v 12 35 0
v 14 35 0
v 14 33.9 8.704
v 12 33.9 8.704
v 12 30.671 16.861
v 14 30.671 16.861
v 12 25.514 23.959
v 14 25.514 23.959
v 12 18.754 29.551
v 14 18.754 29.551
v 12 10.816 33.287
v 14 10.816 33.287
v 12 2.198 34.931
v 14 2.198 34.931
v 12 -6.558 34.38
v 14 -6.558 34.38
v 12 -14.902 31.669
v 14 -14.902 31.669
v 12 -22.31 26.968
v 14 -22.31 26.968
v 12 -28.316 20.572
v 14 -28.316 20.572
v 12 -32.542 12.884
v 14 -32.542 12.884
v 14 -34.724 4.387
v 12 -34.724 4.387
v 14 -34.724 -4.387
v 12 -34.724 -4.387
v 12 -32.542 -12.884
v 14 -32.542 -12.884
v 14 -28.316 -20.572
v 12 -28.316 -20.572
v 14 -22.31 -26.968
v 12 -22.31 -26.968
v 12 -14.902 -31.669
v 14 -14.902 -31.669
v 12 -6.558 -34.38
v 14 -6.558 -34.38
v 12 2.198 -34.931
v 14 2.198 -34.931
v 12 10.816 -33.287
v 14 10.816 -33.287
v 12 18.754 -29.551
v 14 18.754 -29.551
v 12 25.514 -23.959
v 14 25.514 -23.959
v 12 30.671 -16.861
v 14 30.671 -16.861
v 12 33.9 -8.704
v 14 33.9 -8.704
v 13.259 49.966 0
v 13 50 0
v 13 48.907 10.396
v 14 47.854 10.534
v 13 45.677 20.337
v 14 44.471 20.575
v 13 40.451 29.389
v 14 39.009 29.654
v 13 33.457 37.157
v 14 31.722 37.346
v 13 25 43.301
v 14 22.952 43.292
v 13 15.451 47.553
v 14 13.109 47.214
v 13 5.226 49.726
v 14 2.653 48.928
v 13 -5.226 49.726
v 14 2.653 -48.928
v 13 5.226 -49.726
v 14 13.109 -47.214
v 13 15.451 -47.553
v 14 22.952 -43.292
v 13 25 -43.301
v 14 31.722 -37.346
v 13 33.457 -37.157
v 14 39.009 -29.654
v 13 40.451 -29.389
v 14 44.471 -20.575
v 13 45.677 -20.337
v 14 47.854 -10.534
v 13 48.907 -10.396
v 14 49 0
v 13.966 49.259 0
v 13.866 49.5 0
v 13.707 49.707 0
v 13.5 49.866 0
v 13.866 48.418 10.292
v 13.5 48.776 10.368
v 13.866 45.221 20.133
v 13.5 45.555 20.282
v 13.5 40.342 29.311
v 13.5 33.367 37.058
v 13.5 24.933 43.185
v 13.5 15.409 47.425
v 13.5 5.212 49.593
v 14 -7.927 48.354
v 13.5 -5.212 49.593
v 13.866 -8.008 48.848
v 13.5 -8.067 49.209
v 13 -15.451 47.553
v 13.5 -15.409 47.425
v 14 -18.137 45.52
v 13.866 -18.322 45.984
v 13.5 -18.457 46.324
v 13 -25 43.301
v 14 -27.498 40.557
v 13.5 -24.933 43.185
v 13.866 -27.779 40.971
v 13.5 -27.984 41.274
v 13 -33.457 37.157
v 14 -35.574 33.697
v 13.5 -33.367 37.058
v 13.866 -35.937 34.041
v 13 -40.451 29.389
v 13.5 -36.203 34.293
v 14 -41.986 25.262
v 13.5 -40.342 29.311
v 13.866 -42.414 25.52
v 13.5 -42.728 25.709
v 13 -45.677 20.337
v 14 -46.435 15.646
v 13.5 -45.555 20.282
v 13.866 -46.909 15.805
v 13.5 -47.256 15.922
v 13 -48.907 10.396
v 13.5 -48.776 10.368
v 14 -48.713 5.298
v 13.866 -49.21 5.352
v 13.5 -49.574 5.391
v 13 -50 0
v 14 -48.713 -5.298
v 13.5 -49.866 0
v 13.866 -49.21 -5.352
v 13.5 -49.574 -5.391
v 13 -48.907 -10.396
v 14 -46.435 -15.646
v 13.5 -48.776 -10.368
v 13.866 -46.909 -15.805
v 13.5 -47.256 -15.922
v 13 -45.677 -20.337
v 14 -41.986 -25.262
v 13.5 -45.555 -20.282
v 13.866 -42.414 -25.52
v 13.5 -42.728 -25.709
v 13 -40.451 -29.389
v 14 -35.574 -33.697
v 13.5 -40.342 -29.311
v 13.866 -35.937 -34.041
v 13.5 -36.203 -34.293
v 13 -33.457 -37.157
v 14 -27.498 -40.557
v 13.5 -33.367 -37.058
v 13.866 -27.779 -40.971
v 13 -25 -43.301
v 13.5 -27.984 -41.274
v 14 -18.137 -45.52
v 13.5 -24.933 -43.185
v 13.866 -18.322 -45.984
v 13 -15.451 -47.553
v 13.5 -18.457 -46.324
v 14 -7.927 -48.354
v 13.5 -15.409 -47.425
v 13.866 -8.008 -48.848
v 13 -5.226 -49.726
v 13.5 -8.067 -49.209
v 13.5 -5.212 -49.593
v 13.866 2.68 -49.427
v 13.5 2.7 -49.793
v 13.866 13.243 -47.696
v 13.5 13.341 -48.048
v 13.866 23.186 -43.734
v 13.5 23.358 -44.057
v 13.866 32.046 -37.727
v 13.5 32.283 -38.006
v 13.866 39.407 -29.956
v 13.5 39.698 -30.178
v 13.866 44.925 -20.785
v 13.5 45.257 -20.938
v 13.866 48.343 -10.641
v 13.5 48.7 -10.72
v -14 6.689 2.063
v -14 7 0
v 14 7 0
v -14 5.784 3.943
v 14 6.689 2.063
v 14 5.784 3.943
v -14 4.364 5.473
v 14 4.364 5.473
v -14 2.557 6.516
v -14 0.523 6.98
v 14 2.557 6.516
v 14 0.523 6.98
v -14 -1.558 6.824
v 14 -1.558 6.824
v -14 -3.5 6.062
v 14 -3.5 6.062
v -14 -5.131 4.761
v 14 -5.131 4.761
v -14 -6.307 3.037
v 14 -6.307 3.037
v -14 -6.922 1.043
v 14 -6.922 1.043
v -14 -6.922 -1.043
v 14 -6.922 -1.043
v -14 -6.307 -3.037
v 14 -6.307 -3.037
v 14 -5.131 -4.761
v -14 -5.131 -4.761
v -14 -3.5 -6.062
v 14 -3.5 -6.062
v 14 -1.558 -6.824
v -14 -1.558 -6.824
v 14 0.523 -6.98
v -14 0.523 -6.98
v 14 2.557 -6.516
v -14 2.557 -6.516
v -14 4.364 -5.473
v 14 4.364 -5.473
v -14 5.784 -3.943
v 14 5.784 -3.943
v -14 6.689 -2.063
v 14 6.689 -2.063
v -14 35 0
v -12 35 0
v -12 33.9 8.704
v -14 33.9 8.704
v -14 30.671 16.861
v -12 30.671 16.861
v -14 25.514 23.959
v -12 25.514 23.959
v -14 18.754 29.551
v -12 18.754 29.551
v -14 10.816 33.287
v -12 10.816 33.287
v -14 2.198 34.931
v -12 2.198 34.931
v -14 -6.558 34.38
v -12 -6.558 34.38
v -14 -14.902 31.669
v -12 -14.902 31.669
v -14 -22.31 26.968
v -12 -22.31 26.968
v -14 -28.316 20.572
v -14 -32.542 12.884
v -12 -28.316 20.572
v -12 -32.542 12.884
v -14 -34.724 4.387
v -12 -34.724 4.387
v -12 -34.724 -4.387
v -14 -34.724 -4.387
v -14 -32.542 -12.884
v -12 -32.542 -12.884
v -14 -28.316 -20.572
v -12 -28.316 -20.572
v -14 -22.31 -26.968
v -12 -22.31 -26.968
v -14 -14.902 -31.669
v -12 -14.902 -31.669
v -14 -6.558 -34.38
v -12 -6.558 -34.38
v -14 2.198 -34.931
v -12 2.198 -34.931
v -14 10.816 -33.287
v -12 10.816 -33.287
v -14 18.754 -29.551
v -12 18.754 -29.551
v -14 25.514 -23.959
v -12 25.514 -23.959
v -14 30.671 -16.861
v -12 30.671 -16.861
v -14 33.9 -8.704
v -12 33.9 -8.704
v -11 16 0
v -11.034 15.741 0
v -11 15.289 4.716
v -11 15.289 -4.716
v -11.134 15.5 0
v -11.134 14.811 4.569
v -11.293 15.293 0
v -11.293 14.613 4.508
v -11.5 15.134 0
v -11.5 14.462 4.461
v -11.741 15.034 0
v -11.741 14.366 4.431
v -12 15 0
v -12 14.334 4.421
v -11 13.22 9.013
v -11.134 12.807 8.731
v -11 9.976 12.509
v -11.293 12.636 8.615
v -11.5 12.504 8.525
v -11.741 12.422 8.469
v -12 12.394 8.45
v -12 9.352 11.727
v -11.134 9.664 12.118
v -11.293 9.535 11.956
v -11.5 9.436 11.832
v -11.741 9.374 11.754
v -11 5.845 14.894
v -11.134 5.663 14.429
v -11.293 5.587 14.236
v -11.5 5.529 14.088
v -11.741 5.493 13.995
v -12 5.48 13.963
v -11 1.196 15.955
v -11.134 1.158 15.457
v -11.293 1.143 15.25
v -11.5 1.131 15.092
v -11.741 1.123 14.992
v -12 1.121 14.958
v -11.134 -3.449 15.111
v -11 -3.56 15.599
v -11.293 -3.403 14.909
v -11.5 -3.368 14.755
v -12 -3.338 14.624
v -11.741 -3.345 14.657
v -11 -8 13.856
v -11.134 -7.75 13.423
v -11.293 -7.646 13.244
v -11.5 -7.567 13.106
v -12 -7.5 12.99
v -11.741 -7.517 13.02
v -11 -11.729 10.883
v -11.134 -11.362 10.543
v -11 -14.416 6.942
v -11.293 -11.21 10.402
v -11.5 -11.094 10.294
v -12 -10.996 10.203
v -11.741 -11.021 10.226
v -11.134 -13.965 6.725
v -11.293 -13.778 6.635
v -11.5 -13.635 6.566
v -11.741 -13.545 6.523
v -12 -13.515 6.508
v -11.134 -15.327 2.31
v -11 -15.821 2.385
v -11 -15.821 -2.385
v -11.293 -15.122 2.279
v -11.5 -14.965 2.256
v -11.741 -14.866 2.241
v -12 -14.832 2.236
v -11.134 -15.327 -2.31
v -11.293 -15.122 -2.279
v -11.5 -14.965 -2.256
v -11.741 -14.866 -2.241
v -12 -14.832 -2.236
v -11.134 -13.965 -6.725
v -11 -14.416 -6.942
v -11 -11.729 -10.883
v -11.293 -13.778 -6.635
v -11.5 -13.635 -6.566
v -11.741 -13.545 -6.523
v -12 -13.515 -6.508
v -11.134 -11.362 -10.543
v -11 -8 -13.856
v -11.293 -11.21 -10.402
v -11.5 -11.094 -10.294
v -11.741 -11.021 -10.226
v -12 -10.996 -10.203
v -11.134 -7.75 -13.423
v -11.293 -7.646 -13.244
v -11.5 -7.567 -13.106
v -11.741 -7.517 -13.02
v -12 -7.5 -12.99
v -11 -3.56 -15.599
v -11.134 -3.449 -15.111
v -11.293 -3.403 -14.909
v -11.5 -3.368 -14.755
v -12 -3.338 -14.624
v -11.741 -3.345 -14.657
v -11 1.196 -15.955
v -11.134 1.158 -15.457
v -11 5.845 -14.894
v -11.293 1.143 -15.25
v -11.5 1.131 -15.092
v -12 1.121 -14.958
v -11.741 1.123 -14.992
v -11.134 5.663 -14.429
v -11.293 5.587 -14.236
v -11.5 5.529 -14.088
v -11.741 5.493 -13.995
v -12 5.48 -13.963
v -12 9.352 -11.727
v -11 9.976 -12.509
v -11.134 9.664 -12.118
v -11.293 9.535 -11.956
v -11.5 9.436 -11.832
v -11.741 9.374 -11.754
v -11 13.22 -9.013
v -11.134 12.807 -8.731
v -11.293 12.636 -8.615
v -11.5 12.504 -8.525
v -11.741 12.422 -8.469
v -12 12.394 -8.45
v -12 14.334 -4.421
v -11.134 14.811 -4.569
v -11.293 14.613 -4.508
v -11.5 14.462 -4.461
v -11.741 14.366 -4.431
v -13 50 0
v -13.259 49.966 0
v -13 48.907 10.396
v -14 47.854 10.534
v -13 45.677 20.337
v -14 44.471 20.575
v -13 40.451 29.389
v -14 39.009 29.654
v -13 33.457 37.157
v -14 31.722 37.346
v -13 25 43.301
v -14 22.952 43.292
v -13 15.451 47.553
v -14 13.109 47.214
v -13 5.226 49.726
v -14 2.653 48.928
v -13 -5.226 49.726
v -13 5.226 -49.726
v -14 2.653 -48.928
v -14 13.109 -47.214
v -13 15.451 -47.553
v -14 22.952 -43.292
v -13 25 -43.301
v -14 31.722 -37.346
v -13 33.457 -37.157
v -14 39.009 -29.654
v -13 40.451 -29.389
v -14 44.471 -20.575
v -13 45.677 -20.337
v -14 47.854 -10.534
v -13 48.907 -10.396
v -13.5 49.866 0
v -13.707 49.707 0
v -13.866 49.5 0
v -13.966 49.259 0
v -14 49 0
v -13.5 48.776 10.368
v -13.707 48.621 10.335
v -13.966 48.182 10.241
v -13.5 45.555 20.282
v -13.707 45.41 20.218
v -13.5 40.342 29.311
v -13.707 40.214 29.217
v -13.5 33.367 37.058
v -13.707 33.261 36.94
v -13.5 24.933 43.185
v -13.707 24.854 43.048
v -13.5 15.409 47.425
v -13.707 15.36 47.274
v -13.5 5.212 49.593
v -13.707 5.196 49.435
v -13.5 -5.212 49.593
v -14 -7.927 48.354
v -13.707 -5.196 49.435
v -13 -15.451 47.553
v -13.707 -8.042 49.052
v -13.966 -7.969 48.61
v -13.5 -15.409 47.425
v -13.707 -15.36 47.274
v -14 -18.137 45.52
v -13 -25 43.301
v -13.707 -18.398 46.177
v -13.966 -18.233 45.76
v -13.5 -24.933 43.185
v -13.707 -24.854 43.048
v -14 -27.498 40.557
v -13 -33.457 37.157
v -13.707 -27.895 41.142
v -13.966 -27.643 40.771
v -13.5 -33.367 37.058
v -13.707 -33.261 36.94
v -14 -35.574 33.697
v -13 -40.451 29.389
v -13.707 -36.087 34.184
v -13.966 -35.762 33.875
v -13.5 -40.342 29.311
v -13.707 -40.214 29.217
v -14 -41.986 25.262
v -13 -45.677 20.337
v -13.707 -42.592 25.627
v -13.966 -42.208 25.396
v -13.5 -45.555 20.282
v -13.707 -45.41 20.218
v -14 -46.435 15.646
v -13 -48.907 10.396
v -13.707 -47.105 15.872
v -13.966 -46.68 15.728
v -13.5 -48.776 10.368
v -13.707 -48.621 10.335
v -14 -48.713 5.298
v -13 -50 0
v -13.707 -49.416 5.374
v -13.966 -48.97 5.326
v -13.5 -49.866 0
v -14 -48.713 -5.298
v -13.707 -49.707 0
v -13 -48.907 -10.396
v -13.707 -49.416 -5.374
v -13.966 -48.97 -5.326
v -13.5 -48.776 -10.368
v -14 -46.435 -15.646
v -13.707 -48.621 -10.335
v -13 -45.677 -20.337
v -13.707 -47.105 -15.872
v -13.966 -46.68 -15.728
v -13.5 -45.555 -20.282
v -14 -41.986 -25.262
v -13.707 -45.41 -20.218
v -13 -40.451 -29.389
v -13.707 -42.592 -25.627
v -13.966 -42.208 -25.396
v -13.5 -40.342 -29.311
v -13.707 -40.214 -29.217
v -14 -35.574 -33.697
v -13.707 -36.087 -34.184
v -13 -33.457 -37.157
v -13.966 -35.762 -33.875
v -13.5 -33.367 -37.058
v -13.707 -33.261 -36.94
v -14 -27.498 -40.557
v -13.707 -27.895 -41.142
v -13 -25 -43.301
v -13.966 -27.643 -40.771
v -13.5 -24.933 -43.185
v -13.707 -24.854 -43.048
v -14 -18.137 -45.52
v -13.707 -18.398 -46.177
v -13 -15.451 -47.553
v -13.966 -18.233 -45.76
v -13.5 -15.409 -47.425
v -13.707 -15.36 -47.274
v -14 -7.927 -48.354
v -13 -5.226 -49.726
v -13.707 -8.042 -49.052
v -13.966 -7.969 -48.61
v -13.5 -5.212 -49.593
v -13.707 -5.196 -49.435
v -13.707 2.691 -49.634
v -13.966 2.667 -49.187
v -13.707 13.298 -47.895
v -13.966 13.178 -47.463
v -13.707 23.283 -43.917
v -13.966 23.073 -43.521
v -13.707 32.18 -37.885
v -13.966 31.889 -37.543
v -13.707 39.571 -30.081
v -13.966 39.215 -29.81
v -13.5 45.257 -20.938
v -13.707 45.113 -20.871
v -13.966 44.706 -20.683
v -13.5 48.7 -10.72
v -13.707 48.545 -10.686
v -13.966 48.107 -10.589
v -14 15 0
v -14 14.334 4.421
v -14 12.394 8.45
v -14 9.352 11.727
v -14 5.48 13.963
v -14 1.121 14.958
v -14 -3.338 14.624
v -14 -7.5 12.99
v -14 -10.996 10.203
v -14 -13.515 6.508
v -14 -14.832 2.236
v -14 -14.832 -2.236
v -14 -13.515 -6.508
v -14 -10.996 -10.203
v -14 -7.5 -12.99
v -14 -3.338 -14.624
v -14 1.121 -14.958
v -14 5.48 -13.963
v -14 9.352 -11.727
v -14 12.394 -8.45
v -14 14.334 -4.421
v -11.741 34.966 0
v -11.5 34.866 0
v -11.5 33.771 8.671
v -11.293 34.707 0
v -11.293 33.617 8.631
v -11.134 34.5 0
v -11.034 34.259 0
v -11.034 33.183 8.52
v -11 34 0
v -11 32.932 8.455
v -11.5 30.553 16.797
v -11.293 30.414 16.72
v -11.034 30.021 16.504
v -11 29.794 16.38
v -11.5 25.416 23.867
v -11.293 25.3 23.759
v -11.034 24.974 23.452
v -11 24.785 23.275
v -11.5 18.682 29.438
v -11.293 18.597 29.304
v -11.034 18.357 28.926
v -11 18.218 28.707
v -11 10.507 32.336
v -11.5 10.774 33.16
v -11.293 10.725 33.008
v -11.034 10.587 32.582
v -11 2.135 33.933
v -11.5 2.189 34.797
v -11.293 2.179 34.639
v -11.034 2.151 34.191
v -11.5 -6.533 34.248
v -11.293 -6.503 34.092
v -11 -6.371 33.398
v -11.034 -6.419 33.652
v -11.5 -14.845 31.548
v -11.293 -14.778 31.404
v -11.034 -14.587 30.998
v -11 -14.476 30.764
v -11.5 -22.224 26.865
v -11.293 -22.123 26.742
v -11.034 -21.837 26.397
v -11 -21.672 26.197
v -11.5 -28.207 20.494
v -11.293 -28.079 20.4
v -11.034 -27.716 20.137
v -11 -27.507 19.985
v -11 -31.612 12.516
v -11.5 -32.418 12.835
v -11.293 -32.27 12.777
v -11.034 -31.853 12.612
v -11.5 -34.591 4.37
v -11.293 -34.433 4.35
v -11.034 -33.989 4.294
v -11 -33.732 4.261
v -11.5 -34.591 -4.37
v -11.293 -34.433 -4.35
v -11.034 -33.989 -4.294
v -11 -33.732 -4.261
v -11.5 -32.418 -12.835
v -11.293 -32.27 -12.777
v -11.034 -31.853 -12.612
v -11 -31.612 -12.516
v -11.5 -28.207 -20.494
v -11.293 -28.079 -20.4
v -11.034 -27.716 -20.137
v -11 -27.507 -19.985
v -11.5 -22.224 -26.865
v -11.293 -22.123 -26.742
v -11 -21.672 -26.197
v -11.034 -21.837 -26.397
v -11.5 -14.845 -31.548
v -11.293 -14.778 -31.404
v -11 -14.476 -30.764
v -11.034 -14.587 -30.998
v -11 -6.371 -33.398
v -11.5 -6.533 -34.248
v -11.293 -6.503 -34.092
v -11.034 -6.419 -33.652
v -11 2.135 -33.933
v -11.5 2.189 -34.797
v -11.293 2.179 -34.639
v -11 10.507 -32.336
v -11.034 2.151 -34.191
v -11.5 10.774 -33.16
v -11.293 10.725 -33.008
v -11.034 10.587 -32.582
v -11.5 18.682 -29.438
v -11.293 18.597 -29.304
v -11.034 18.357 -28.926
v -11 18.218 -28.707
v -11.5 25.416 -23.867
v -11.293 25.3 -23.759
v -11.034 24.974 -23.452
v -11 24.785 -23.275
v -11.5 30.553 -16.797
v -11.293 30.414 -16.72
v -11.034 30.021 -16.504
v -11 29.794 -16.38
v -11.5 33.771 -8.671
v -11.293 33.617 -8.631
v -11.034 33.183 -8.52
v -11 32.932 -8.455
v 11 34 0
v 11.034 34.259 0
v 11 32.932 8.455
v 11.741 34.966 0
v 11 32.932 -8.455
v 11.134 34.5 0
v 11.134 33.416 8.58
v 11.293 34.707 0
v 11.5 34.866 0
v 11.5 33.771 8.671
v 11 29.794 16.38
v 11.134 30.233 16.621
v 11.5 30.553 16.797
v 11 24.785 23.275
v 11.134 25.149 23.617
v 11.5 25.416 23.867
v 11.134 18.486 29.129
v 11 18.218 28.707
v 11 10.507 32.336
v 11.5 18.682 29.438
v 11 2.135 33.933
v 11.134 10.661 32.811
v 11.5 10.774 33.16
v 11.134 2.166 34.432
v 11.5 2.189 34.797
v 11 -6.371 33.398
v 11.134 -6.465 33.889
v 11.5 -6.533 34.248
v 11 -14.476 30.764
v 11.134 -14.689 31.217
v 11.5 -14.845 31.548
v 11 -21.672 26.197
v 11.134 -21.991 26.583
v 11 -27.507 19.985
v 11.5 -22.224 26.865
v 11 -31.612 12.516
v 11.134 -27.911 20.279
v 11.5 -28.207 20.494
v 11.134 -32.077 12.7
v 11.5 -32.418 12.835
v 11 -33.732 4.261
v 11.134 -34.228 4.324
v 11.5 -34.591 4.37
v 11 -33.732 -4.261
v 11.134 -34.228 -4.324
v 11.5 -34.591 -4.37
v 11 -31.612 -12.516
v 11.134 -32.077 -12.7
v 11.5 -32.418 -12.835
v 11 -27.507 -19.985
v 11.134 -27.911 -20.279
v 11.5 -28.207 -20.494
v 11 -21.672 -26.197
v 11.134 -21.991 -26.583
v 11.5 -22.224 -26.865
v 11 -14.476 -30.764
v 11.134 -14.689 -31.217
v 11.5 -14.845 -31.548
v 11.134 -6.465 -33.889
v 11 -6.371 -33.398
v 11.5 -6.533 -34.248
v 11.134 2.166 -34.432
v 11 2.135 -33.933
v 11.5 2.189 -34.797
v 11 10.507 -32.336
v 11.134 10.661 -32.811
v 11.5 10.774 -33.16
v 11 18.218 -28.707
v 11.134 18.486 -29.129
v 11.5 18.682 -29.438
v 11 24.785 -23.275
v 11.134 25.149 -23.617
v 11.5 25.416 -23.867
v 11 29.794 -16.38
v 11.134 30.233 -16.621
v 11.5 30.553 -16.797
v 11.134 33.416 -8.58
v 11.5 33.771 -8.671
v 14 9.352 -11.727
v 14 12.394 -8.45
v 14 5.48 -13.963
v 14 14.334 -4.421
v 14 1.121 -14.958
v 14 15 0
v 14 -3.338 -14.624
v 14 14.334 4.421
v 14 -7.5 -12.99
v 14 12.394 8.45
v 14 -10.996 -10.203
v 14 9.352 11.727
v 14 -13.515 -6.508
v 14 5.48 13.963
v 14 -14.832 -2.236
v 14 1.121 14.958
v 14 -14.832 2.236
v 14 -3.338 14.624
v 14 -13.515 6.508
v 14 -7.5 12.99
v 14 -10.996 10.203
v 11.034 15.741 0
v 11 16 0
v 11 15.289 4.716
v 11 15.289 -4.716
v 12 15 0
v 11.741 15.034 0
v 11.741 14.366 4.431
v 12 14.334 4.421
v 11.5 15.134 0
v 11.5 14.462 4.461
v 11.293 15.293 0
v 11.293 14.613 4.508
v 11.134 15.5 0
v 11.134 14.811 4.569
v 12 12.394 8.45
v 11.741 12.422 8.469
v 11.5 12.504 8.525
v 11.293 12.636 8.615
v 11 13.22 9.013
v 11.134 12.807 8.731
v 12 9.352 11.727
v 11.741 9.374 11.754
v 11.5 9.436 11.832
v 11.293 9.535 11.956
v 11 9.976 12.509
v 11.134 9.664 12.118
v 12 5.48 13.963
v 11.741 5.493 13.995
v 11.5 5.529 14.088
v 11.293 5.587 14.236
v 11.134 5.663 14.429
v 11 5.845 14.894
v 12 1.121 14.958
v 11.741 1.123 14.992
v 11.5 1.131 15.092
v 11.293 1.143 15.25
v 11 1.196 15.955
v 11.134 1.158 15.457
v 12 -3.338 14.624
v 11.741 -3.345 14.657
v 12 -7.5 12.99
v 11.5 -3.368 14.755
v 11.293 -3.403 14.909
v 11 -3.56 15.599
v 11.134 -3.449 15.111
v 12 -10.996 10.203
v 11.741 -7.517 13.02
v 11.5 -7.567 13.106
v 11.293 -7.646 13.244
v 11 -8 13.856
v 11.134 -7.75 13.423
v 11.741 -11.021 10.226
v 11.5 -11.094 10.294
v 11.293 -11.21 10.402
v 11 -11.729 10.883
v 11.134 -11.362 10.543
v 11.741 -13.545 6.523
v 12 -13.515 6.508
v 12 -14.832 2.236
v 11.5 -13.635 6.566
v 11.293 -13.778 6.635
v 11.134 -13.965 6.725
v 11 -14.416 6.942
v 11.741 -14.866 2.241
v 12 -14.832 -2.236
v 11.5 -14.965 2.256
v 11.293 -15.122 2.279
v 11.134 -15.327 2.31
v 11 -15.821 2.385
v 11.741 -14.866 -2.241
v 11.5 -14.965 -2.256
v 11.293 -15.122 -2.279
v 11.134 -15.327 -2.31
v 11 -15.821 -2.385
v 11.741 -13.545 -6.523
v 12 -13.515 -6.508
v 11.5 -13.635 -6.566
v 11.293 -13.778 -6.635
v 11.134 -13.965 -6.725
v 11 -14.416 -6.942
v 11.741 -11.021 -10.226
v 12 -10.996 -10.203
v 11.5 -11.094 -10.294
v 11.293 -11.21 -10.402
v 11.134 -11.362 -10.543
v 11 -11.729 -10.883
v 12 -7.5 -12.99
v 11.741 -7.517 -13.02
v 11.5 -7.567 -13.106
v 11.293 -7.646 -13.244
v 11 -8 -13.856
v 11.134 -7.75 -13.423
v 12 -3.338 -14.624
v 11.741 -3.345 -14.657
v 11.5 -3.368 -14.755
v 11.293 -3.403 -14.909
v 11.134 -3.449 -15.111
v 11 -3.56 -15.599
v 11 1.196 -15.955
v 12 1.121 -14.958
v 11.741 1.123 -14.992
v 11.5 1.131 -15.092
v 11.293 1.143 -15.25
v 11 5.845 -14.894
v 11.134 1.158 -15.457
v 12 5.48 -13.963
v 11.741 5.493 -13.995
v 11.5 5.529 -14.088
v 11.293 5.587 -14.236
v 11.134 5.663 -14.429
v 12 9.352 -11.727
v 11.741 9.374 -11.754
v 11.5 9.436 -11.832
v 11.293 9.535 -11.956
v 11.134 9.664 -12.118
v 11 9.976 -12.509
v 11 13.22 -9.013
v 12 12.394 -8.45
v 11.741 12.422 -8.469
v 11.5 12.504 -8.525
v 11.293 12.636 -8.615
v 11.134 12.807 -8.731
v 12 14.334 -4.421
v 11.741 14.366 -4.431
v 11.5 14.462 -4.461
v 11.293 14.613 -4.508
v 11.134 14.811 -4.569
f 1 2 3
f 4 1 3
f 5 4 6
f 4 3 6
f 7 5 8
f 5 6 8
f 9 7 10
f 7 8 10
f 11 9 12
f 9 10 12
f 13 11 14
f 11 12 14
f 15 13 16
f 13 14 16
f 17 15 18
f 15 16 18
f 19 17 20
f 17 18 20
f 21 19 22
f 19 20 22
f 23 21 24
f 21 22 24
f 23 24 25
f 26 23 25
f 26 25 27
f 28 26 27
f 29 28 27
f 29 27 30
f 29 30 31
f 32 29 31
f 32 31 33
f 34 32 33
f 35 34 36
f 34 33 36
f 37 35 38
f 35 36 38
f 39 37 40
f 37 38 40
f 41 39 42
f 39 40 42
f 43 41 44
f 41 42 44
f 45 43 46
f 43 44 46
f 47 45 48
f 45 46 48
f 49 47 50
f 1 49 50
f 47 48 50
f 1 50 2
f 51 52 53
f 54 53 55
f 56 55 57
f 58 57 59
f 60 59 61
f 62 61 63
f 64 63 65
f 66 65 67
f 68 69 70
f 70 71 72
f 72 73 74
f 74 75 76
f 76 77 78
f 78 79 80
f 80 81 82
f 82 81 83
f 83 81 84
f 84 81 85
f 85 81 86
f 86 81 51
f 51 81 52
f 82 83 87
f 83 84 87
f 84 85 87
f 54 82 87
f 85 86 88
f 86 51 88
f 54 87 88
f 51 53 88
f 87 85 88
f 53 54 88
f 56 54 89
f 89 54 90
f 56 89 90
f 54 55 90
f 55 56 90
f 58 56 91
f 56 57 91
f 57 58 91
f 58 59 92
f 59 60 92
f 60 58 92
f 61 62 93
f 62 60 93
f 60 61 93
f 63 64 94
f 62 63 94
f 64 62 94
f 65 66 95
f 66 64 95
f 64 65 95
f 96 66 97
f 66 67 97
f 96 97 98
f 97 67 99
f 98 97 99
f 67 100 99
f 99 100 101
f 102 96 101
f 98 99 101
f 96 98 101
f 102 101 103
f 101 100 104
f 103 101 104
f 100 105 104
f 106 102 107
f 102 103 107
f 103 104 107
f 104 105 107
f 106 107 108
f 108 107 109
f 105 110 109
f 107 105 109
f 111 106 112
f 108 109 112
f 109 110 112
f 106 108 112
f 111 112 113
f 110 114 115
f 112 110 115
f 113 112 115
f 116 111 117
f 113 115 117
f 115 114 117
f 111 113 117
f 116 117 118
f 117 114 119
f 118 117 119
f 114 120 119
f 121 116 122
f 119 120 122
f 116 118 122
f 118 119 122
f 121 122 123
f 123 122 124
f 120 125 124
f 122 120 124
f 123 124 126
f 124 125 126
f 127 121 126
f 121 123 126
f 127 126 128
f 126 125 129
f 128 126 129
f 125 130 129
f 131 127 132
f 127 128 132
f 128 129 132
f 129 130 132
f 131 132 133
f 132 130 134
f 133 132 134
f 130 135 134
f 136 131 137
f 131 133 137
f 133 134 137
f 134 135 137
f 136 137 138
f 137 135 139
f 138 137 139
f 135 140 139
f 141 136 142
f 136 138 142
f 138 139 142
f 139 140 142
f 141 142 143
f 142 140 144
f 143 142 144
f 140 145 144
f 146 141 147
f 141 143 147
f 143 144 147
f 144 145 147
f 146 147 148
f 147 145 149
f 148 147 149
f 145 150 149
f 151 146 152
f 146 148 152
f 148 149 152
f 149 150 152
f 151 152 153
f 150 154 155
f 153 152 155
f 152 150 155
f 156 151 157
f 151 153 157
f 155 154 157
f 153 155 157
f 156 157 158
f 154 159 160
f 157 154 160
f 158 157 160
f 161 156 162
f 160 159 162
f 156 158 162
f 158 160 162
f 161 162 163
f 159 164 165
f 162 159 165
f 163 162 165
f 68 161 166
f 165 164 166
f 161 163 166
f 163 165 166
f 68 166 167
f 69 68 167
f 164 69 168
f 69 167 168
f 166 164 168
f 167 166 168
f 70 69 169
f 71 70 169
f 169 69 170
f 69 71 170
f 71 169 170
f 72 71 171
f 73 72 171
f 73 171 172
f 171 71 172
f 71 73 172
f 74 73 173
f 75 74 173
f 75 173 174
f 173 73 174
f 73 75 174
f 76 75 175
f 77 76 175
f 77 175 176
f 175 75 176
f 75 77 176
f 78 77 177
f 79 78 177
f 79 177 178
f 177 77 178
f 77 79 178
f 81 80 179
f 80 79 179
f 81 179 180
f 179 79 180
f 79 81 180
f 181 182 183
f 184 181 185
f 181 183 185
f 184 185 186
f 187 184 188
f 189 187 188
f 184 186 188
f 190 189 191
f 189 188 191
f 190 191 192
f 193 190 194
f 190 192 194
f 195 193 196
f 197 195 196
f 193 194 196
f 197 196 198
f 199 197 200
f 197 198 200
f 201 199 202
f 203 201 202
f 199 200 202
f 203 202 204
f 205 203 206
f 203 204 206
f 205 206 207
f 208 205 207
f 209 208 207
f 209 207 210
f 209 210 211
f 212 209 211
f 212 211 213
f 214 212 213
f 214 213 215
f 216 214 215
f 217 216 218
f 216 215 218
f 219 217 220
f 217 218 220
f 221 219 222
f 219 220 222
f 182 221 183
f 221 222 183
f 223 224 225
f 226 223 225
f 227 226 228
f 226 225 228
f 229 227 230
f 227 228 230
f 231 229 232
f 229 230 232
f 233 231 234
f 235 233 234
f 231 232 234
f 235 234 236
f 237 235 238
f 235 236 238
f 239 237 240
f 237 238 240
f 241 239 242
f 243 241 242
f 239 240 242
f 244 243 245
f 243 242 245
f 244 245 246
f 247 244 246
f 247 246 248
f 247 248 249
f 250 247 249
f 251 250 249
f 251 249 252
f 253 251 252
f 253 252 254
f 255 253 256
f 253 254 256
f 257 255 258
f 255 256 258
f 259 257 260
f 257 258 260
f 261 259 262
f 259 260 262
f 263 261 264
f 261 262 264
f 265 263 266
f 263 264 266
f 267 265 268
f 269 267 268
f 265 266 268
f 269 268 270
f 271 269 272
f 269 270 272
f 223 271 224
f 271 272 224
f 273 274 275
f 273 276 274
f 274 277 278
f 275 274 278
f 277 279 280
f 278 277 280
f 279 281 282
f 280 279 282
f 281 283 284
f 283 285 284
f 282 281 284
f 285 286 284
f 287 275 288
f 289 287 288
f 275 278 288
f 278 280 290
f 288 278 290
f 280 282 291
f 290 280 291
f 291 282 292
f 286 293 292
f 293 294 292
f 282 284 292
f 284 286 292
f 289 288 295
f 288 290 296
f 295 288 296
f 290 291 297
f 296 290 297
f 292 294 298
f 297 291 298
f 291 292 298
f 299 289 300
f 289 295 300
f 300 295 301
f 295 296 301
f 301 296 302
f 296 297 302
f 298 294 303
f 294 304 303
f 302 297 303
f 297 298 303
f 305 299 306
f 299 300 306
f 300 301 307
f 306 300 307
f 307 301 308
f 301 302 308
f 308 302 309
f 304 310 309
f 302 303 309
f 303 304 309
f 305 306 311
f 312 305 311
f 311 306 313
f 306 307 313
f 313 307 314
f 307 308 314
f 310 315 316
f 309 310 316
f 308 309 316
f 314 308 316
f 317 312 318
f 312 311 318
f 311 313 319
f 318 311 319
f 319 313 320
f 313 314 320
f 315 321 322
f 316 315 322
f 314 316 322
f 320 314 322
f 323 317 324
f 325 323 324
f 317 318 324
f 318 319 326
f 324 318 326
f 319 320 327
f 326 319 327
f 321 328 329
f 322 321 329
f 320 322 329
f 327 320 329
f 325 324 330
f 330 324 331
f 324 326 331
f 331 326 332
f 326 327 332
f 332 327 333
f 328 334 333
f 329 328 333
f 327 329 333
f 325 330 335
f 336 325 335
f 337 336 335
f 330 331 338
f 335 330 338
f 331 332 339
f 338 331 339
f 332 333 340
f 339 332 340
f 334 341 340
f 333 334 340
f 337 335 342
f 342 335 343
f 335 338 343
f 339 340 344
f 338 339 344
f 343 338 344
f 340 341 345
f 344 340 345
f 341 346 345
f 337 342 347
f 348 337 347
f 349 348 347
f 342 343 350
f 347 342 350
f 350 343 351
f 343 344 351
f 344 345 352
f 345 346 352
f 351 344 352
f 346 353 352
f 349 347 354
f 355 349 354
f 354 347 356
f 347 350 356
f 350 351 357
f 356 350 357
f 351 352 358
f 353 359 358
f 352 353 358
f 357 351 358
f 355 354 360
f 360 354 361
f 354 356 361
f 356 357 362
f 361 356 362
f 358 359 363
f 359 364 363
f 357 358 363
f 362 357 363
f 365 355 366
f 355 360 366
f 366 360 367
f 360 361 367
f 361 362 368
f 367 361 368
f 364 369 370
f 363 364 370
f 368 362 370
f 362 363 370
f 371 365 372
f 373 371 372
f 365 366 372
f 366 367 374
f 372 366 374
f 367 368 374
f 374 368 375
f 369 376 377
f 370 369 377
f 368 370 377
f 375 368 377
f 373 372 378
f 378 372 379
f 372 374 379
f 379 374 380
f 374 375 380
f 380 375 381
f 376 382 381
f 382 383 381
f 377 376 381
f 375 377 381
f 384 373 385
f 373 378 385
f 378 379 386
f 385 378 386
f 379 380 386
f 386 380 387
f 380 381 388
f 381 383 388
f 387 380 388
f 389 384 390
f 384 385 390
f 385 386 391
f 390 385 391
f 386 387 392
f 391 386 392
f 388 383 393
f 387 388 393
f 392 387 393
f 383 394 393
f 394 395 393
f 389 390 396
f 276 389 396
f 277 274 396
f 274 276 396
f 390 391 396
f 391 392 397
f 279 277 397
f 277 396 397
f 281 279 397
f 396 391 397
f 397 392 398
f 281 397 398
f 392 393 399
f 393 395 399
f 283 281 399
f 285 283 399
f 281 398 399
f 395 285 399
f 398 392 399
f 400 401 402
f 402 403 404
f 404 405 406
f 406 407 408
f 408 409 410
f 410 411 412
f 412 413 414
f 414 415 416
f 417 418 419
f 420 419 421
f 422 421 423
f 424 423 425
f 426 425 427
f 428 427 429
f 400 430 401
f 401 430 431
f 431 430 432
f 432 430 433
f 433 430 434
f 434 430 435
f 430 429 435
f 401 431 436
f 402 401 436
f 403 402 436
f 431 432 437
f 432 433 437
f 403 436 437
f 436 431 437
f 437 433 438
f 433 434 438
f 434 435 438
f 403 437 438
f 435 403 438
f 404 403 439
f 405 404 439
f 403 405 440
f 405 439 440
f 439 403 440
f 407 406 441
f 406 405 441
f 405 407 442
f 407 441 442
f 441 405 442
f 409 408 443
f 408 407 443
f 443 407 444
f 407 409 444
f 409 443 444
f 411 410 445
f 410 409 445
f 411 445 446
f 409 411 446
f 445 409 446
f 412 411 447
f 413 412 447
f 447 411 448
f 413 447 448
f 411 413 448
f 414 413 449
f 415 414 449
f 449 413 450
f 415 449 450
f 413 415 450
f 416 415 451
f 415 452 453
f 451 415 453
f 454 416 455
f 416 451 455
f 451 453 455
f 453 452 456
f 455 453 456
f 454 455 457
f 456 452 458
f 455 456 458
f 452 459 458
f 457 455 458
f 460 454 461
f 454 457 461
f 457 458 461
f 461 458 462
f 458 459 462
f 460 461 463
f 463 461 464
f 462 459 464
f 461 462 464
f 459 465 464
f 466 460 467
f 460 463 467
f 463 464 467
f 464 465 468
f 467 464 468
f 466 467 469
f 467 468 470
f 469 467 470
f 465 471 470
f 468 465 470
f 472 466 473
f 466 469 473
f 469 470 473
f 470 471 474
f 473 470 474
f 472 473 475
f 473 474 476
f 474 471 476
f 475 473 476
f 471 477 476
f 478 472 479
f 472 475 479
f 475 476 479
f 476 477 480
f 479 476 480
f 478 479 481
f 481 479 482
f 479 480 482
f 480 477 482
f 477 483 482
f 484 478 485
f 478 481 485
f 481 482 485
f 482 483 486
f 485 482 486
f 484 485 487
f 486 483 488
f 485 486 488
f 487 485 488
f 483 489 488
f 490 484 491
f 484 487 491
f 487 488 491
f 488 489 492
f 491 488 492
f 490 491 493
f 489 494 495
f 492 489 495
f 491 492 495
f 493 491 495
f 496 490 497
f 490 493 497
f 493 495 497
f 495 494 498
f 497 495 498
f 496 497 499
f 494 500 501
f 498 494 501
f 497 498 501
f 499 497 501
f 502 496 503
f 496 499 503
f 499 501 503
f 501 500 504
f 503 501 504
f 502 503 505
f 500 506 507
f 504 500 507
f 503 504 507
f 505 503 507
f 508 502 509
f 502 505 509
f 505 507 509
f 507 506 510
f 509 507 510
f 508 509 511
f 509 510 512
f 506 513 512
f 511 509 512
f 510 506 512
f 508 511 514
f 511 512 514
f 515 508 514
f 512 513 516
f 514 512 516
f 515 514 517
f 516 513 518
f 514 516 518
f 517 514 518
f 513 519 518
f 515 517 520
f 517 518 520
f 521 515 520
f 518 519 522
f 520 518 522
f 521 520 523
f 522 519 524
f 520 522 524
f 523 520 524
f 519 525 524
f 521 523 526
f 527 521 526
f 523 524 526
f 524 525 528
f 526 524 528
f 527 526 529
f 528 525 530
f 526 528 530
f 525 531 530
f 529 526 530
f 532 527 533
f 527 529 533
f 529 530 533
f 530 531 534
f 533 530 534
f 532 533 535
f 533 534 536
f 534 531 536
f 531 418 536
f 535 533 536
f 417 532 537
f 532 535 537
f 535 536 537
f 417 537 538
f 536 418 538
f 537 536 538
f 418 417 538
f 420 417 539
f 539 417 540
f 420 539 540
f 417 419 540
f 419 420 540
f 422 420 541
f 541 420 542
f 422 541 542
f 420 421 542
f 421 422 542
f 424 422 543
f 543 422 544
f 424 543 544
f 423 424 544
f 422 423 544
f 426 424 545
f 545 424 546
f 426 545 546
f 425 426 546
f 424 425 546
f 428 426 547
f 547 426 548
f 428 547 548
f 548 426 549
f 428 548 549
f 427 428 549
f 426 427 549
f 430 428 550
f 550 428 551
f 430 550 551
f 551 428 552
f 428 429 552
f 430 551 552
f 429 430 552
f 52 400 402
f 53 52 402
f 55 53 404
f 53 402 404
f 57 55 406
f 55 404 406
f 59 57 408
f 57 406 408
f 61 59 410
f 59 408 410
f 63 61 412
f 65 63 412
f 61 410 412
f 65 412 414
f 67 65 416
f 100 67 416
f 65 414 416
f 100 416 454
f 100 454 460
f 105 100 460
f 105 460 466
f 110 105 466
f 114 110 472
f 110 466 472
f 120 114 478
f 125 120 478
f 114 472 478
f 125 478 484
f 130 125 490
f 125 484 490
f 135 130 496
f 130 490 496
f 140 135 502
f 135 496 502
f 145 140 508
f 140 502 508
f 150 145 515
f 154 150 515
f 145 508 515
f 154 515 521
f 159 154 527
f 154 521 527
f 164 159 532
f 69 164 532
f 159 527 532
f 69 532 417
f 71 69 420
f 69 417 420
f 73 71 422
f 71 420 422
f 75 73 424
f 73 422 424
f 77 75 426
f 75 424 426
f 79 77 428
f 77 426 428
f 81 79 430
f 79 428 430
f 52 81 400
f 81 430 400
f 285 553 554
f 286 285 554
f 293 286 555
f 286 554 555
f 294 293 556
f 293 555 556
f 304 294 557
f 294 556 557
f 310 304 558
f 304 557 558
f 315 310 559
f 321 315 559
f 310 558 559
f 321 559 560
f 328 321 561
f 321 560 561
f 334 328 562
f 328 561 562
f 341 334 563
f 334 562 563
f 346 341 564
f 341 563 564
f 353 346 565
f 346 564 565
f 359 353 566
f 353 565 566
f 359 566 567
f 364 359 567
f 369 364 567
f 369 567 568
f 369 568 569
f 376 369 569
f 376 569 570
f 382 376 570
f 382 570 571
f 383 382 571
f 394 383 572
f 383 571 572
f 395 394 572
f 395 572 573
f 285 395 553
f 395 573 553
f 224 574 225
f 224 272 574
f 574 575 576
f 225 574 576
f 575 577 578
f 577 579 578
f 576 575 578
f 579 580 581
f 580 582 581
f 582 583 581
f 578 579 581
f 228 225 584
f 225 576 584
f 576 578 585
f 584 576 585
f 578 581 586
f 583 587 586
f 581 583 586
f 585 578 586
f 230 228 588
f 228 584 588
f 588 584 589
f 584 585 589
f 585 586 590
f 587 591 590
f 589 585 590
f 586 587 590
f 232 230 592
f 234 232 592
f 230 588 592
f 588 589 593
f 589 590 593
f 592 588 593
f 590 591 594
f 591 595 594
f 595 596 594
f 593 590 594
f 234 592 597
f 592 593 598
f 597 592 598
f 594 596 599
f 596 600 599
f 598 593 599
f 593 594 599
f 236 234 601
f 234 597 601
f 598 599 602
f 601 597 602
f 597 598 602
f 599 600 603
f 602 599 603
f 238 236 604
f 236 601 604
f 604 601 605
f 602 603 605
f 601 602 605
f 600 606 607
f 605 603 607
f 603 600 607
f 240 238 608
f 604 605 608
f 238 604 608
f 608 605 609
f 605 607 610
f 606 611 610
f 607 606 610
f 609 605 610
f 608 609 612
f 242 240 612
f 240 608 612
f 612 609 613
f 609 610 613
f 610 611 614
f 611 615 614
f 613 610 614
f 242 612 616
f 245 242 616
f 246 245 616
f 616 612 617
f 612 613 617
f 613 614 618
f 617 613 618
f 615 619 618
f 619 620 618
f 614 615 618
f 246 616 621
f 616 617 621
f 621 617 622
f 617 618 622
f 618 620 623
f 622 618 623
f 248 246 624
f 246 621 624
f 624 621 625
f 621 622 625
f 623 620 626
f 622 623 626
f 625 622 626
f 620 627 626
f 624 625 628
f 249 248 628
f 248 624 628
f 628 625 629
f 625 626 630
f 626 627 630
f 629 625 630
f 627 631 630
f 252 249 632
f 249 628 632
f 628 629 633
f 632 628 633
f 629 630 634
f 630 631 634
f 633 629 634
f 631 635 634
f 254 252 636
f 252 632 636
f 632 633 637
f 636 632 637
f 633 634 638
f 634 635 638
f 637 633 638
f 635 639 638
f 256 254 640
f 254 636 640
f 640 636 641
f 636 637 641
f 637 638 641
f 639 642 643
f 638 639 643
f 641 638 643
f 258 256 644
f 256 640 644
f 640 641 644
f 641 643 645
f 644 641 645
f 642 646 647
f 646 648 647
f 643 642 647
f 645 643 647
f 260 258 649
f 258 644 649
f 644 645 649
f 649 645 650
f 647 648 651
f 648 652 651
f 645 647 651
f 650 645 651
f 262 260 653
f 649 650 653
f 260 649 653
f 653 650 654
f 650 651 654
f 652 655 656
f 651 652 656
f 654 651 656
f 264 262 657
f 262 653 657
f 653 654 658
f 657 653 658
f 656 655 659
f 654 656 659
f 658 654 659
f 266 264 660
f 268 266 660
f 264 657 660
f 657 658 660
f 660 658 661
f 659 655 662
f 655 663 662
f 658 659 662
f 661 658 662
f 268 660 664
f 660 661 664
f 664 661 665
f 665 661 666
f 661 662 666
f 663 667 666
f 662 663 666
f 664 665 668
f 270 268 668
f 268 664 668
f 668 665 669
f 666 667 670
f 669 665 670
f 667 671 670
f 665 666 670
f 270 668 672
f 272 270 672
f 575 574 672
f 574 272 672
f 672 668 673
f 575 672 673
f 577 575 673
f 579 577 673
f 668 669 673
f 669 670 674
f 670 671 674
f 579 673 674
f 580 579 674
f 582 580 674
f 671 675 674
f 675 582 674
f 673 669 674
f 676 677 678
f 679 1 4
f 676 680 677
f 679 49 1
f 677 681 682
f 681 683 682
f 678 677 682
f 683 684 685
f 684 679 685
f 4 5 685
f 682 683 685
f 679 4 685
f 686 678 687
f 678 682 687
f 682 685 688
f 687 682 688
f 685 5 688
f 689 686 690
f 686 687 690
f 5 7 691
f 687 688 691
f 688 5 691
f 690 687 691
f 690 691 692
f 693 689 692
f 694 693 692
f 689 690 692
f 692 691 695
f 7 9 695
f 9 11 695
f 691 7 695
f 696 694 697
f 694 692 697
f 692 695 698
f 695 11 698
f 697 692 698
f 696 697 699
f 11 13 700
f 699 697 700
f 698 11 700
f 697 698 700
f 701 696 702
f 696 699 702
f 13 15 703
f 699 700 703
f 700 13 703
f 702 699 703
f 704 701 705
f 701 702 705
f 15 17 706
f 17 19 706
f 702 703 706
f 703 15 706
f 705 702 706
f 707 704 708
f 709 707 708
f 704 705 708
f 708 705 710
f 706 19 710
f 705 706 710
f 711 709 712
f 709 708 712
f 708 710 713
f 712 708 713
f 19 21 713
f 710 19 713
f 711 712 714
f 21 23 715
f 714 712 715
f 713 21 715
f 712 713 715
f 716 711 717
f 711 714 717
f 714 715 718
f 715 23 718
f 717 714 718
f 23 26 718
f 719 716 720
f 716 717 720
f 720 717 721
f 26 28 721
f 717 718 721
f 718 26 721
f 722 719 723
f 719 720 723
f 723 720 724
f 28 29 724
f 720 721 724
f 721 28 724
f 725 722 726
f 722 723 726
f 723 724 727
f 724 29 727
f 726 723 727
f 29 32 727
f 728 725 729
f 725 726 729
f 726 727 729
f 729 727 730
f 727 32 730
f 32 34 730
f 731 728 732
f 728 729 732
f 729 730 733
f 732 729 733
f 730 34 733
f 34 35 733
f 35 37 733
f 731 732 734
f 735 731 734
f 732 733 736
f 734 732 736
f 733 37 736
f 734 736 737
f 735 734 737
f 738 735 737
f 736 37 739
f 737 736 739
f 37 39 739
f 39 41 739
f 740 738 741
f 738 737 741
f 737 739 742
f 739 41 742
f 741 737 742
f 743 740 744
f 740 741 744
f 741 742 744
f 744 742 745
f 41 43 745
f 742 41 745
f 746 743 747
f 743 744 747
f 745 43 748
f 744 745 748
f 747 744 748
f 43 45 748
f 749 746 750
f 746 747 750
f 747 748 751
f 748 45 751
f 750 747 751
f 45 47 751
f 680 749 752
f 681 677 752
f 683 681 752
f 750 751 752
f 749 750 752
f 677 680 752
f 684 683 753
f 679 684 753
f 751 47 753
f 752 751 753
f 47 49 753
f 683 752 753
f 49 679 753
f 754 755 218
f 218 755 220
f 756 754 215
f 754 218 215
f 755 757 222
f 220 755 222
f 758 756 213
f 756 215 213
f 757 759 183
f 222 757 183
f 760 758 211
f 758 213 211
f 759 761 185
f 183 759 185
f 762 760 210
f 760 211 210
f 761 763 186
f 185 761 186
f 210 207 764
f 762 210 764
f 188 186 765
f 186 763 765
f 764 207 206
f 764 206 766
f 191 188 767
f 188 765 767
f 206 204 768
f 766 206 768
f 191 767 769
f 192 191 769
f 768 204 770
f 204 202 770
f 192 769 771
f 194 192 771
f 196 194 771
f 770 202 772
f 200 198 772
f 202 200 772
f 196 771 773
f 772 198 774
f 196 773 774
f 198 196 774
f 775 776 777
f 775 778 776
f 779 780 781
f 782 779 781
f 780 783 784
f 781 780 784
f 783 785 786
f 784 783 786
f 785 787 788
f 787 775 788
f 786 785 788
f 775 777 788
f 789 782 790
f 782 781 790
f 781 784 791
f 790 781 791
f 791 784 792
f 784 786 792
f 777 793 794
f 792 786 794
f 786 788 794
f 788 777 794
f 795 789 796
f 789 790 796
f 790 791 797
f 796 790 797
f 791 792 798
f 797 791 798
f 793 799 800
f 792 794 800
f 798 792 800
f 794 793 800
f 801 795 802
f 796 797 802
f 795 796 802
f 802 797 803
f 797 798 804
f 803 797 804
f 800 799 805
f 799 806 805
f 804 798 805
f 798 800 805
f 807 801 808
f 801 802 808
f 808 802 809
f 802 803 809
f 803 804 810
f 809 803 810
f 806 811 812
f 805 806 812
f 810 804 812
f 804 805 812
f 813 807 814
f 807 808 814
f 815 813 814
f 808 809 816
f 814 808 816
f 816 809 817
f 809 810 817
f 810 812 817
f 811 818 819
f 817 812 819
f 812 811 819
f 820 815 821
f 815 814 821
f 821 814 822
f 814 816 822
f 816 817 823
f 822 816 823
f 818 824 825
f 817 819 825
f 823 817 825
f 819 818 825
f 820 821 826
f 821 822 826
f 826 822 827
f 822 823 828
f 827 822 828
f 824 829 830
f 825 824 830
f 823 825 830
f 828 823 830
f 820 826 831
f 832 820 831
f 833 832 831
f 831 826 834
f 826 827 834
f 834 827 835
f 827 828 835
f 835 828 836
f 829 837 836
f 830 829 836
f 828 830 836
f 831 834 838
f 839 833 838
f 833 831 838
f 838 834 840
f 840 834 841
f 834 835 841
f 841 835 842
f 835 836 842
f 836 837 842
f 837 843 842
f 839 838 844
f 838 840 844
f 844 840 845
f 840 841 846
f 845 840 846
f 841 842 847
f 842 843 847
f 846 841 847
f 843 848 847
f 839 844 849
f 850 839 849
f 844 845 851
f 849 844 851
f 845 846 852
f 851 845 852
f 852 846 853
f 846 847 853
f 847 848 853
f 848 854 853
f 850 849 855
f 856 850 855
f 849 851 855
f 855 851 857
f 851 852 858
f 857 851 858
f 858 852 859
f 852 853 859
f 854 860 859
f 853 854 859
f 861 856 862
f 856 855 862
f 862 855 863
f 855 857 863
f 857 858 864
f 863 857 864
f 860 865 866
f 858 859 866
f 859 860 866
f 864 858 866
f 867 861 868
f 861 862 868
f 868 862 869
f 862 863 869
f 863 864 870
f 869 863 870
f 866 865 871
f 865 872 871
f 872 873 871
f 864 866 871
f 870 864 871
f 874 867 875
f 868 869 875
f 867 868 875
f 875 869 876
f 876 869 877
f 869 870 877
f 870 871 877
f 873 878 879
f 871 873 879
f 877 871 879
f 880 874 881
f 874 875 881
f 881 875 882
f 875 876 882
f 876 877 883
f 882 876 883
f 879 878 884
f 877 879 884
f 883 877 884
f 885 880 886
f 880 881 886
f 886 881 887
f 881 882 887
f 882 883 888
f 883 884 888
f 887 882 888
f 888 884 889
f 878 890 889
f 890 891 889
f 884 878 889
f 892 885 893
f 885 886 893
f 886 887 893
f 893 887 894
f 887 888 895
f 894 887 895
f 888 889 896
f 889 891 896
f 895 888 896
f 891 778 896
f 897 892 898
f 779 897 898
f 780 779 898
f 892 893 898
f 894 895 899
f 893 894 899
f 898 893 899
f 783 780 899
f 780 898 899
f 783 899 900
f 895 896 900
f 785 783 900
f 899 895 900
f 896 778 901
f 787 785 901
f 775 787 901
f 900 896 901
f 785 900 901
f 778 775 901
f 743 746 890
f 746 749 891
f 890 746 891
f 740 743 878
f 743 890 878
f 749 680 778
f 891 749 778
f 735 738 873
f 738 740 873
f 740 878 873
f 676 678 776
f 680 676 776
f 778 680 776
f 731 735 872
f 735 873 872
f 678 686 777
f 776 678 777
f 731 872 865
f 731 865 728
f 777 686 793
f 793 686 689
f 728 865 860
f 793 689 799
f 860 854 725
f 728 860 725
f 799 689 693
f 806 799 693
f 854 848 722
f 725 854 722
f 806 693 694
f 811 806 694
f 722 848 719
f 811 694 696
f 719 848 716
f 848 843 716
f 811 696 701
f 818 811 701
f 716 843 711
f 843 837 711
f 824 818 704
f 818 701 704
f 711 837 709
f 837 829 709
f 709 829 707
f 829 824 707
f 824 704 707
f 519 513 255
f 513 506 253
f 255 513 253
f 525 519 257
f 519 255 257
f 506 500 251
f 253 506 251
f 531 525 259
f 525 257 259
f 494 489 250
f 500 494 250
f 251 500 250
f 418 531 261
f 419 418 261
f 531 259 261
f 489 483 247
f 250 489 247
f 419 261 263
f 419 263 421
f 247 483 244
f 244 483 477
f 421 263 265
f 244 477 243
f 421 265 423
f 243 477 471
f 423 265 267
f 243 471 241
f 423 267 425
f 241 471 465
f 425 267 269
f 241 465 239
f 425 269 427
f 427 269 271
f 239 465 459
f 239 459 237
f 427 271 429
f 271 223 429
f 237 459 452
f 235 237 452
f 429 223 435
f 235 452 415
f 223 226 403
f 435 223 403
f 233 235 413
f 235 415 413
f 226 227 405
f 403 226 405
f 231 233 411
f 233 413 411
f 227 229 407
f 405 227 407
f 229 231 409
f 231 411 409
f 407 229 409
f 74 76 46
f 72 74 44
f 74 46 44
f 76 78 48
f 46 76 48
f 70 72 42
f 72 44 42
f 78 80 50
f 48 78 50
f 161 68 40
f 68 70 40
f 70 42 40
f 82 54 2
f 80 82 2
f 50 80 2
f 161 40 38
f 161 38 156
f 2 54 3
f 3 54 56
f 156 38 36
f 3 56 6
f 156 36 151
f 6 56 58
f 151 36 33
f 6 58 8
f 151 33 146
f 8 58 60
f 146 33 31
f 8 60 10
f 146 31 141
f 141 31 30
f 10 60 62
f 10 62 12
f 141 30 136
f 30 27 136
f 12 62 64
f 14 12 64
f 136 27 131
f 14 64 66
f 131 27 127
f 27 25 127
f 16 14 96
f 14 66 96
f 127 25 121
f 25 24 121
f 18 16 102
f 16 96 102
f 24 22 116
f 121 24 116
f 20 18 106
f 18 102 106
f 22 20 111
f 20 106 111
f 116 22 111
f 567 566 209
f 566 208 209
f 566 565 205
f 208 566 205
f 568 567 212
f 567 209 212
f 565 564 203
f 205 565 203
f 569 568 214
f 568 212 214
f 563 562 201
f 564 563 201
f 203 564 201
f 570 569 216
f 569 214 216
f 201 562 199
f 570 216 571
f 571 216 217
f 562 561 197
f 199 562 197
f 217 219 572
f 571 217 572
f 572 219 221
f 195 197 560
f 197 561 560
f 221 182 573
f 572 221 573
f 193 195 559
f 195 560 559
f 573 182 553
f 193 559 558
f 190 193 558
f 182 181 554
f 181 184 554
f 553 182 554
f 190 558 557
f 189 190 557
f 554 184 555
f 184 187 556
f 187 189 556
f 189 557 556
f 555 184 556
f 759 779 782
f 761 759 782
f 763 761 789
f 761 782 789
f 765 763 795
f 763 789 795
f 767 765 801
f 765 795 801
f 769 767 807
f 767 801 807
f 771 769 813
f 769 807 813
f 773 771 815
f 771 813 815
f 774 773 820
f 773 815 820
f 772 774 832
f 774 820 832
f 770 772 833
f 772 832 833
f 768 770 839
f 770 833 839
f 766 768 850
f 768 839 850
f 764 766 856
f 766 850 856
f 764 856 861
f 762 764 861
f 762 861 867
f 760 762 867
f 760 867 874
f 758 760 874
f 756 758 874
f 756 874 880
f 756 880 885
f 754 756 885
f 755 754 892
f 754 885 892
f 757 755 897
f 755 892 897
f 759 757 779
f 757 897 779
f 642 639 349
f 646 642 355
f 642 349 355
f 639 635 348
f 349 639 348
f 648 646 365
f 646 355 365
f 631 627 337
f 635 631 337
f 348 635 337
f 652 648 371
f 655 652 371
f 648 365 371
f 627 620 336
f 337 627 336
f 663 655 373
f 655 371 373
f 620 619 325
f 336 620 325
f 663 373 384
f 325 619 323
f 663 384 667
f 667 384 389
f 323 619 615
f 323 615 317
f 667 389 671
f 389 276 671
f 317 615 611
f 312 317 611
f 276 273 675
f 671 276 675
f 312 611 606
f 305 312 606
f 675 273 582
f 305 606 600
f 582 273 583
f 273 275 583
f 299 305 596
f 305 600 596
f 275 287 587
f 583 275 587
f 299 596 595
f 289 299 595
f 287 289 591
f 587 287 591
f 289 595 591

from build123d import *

# Parameters (mm, degrees)
FILLET1_R = 1


with BuildPart() as part:
    # Sketch1 → Revolve1 (revolve)
    with BuildSketch(Plane.XY):
        Polygon((14, 7), (14, 15), (11, 15), (11, 35), (14, 35), (14, 50), (-14, 50), (-14, 35), (-11, 35), (-11, 15), (-14, 15), (-14, 7), align=None)
    revolve(axis=Axis((0, 0, 0), (1, 0, 0)))

    # Fillet1
    fillet1_edges = [part.edges().sort_by_distance(p)[0] for p in [
        (-11, -15, 0),
        (-11, -35, 0),
        (-14, -50, 0),
        (14, -50, 0),
        (11, -35, 0),
        (11, -15, 0),
    ]]
    fillet(fillet1_edges, radius=FILLET1_R)


solid = part.part
